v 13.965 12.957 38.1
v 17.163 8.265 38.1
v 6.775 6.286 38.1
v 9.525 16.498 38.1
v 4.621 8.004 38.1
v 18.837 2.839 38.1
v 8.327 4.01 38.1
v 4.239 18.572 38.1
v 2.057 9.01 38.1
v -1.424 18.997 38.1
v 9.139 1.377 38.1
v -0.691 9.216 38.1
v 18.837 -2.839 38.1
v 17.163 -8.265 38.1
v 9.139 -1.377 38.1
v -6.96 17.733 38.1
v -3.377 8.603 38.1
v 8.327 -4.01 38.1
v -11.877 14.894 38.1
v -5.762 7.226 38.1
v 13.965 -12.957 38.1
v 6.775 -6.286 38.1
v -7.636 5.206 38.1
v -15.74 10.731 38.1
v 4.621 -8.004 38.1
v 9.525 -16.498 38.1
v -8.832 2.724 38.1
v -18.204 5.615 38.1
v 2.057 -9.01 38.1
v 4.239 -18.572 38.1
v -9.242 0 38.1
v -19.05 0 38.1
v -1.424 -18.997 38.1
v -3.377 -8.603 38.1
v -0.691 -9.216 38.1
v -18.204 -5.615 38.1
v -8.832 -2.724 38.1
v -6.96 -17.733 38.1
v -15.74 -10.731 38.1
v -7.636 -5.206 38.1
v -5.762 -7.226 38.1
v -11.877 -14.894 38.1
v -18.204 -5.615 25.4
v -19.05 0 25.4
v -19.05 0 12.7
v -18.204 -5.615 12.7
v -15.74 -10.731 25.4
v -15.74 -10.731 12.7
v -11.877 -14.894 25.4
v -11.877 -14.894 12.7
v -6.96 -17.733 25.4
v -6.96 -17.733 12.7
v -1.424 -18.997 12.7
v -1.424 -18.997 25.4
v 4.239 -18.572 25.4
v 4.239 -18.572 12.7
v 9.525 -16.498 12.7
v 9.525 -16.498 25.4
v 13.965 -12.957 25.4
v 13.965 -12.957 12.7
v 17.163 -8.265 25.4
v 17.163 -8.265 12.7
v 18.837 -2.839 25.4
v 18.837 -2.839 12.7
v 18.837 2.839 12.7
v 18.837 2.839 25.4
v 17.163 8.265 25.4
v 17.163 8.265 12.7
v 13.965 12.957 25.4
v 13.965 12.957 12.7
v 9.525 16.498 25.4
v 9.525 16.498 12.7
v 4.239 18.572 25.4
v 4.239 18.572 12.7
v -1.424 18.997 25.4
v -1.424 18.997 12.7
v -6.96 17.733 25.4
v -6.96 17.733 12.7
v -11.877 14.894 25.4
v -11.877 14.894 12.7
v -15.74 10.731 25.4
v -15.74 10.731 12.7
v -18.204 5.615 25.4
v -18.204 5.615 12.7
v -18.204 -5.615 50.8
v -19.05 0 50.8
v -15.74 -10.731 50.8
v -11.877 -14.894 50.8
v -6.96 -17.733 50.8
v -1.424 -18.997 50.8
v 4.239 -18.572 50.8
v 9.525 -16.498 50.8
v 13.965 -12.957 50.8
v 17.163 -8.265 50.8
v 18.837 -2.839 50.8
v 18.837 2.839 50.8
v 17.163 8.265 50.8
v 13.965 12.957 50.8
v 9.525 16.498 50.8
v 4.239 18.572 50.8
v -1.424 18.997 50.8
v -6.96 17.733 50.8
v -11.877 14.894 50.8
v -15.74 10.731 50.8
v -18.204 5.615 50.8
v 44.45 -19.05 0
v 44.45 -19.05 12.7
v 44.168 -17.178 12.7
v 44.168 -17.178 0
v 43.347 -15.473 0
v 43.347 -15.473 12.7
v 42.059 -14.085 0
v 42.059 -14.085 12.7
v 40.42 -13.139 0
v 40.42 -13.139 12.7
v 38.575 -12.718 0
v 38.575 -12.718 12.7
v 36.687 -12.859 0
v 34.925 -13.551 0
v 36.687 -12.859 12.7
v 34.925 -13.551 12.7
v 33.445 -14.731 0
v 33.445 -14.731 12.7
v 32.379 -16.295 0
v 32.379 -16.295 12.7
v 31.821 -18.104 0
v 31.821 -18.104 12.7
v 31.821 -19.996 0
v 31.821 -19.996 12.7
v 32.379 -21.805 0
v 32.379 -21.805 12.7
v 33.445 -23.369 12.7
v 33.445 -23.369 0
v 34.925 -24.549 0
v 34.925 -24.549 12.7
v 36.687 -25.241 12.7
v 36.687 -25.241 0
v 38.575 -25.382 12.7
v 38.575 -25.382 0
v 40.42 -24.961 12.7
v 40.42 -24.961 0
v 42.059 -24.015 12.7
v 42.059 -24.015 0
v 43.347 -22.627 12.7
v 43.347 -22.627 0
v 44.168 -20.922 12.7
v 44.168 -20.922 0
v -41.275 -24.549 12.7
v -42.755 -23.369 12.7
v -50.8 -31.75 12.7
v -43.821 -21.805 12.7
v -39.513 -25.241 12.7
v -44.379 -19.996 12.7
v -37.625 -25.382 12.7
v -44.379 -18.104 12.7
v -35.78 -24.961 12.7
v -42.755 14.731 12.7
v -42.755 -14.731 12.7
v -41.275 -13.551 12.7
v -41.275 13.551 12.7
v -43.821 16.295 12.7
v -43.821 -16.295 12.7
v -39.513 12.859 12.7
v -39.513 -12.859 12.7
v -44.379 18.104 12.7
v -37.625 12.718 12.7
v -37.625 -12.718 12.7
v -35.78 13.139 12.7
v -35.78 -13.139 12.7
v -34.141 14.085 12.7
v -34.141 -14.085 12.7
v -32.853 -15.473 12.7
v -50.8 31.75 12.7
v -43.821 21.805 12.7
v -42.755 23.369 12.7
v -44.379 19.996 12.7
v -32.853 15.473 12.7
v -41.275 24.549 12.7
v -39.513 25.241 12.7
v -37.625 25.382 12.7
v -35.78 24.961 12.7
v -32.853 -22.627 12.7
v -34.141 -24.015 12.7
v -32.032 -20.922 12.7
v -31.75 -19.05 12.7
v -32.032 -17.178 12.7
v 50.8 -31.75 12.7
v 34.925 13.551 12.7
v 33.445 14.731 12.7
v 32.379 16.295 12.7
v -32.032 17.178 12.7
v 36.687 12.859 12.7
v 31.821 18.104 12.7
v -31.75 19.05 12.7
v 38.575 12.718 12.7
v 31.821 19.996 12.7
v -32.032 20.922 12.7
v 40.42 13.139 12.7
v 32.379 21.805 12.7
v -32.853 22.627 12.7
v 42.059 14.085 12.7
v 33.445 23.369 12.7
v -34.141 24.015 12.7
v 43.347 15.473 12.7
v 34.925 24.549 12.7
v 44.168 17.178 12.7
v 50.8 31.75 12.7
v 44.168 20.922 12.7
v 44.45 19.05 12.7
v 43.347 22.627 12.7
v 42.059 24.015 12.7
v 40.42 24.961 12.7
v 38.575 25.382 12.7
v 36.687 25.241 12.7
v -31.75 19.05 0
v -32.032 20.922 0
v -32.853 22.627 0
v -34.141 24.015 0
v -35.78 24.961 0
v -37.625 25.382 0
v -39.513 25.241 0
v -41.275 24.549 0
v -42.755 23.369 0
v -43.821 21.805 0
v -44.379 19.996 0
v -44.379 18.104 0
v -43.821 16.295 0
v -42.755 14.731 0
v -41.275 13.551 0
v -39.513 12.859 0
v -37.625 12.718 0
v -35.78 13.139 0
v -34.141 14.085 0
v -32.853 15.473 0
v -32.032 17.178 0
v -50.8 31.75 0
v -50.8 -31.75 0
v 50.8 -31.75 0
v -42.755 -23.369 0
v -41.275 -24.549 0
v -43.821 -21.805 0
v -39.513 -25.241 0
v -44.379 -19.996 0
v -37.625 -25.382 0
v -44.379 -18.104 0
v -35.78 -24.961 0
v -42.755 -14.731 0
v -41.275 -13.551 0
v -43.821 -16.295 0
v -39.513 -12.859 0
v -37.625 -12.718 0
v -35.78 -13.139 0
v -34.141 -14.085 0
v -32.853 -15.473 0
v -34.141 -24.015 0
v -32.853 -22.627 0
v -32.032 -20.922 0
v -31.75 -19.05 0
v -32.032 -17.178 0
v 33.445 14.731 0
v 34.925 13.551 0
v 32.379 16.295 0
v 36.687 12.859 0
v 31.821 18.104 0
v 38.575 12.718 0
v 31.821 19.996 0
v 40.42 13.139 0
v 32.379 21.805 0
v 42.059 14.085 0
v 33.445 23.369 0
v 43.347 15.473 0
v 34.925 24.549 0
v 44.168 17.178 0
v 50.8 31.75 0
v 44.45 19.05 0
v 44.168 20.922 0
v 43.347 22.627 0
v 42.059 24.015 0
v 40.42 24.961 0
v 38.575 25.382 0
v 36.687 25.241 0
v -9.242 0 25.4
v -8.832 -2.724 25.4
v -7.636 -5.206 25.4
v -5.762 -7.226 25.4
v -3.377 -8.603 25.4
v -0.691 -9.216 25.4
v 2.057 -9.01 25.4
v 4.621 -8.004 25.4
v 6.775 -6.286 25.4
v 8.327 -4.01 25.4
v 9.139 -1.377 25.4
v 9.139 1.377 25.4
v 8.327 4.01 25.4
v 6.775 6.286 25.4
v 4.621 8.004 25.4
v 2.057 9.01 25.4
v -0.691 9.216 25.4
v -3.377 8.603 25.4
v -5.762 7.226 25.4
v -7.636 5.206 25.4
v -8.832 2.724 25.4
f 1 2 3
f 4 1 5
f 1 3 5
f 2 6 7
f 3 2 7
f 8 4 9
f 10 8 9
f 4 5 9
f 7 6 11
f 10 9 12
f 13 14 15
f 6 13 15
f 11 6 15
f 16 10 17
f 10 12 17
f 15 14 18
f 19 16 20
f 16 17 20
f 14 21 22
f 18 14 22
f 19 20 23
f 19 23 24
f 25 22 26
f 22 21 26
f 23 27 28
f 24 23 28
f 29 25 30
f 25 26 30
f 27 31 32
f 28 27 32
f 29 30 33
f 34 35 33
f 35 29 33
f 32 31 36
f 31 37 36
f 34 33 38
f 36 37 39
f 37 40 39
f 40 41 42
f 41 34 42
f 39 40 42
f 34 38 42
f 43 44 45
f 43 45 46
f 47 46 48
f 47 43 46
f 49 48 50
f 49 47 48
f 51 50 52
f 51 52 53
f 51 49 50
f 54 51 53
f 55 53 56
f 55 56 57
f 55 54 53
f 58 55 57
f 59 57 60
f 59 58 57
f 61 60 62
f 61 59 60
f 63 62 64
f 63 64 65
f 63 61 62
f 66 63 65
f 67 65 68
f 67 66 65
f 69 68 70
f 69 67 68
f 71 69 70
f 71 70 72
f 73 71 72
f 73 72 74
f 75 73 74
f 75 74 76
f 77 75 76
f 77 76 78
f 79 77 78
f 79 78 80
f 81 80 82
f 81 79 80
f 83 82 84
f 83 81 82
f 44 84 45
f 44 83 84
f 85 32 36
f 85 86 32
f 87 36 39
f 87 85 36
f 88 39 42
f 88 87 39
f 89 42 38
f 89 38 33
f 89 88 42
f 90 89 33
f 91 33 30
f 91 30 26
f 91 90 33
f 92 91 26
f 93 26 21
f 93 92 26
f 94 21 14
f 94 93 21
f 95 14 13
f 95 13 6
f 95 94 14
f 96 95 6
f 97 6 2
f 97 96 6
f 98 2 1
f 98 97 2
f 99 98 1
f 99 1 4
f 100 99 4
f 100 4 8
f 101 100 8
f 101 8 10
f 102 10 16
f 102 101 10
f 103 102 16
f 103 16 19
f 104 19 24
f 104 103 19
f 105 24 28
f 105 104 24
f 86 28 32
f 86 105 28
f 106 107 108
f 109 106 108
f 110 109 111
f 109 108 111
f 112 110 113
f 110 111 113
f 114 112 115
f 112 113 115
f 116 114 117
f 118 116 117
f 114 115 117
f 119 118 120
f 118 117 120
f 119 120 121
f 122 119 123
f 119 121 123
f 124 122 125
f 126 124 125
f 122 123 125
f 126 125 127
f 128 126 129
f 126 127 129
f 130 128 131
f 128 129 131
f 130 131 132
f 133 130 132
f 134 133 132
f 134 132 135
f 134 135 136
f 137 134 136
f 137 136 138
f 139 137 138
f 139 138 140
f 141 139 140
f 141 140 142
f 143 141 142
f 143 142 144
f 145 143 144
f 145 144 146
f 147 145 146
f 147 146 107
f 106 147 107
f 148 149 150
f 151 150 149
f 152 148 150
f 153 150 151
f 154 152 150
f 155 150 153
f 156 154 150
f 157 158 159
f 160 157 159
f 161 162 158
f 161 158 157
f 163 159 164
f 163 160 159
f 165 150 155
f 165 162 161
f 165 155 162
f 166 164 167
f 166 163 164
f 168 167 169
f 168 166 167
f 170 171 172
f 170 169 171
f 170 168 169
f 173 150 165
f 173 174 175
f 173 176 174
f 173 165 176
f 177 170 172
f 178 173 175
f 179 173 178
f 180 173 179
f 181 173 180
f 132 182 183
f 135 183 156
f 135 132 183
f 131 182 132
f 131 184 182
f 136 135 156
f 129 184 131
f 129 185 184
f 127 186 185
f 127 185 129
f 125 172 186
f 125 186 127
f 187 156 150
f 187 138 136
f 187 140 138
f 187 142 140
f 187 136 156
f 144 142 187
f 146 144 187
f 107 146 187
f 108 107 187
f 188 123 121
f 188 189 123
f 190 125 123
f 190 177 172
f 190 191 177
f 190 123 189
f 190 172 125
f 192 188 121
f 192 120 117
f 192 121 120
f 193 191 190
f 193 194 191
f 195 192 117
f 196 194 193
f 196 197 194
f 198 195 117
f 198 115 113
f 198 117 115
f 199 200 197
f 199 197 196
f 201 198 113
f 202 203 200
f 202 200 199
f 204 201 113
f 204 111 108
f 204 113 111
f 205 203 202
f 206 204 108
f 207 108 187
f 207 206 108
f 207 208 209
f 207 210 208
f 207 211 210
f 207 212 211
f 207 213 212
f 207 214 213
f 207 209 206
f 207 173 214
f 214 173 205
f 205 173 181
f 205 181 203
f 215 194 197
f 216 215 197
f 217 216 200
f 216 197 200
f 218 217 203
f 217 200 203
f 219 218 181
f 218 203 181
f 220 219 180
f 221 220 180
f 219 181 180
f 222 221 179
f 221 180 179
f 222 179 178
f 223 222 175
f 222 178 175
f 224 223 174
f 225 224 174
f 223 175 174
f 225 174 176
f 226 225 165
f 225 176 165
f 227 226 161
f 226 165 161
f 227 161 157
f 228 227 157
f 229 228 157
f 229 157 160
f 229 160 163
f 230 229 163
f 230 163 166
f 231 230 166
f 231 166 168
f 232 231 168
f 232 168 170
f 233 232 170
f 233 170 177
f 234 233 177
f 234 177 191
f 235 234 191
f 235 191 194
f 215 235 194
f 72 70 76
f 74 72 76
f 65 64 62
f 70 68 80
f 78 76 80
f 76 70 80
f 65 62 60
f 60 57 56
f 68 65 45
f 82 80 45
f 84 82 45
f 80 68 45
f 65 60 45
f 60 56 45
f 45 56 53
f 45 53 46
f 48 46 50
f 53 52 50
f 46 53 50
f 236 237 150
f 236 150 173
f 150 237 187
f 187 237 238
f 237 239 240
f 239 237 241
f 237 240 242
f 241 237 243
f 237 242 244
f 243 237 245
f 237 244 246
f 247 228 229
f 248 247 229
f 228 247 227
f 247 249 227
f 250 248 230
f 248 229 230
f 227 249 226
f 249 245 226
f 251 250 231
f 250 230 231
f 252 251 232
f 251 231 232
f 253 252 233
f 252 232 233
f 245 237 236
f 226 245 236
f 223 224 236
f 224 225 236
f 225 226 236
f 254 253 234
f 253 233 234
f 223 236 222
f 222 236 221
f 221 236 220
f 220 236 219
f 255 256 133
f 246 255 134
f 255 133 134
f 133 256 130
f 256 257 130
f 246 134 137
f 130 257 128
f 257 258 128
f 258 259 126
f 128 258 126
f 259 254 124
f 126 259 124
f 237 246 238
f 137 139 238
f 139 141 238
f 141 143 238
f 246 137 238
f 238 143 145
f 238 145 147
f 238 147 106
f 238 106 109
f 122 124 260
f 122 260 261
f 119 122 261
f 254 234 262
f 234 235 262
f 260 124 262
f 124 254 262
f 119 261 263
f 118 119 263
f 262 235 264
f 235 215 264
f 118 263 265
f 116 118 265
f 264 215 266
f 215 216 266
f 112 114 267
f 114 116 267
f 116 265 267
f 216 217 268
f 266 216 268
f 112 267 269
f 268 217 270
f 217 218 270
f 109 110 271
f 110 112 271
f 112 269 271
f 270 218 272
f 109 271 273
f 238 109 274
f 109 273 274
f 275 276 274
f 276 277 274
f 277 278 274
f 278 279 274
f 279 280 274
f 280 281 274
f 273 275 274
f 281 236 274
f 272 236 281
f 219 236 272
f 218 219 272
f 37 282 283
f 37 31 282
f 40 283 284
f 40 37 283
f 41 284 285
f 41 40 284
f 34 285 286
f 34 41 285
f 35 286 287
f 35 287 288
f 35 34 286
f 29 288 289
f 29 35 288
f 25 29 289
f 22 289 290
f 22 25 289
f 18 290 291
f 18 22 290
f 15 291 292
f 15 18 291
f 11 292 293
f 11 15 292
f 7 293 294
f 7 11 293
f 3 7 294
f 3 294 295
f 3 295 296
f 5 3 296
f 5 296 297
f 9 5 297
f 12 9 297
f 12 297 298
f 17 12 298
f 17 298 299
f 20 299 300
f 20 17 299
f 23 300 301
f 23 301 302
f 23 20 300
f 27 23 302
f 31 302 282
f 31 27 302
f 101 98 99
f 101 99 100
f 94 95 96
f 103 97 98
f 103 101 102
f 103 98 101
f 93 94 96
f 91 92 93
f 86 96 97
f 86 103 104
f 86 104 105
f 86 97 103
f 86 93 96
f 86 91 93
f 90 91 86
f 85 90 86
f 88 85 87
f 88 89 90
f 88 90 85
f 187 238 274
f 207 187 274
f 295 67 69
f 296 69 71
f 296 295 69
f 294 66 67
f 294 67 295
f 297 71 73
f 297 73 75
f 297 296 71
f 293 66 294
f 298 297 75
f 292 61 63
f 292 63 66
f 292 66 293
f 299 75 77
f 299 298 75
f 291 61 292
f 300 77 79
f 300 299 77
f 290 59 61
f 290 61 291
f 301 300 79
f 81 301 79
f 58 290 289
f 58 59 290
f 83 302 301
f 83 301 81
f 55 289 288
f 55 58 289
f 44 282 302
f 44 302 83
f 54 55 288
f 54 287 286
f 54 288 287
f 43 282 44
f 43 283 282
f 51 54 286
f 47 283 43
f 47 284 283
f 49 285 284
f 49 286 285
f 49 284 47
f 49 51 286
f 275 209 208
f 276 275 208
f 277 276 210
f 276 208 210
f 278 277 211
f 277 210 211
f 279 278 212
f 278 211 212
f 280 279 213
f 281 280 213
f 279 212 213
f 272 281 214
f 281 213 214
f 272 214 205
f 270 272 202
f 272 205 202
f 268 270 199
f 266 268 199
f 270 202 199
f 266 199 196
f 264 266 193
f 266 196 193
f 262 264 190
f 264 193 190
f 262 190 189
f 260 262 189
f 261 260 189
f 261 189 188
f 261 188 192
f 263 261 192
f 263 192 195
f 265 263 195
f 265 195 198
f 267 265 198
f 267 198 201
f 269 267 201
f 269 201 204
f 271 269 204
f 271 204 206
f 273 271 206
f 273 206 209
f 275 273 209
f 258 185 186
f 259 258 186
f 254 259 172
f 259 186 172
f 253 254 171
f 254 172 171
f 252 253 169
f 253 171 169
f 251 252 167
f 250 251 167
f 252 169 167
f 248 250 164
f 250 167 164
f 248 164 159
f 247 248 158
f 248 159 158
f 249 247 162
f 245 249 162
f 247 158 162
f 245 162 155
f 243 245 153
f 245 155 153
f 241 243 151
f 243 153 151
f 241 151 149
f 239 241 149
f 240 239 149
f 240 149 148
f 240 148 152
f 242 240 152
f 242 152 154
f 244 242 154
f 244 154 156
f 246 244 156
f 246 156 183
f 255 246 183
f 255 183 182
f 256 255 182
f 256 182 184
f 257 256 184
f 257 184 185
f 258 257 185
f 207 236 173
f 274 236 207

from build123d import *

# Parameters (mm, degrees)
F0_W     = 101.6
F0_H     = 63.5
F1_DEPTH = 12.7
F2_R     = 6.35
F3_DEPTH = 25.4
F4_W     = 19.05
F4_H     = 38.1
F6_W     = 36.313035
F6_H     = 12.7


with BuildPart() as f1:
    # F0 (on Top) → F1 (new body)
    with BuildSketch(Plane.XY):
        Rectangle(F0_W, F0_H)
    extrude(amount=F1_DEPTH)

    # F2 (on face) → F3 (cut)
    with BuildSketch(Plane.XY.offset(12.7)):
        with Locations((-38.1, -19.05)):
            Circle(F2_R)
        with Locations((-38.1, 19.05)):
            Circle(F2_R)
        with Locations((38.1, -19.05)):
            Circle(F2_R)
        with Locations((38.1, 19.05)):
            Circle(F2_R)
    extrude(amount=-F3_DEPTH, mode=Mode.SUBTRACT)


with BuildPart() as f5:
    # F4 (on Front) → F5 (revolve)
    with BuildSketch(Plane.XZ):
        with Locations((-9.525, 31.75)):
            Rectangle(F4_W, F4_H)
    revolve(axis=Axis((0, 0, 31.75), (0, 0, 1)))

    # F6 (on Front) → F7 (revolve, cut)
    with BuildSketch(Plane.XZ):
        with Locations((-27.398689, 31.75)):
            Rectangle(F6_W, F6_H)
    revolve(axis=Axis((0, 0, 33.592541), (0, 0, 1)), mode=Mode.SUBTRACT)


solid = Compound([f1.part, f5.part])
